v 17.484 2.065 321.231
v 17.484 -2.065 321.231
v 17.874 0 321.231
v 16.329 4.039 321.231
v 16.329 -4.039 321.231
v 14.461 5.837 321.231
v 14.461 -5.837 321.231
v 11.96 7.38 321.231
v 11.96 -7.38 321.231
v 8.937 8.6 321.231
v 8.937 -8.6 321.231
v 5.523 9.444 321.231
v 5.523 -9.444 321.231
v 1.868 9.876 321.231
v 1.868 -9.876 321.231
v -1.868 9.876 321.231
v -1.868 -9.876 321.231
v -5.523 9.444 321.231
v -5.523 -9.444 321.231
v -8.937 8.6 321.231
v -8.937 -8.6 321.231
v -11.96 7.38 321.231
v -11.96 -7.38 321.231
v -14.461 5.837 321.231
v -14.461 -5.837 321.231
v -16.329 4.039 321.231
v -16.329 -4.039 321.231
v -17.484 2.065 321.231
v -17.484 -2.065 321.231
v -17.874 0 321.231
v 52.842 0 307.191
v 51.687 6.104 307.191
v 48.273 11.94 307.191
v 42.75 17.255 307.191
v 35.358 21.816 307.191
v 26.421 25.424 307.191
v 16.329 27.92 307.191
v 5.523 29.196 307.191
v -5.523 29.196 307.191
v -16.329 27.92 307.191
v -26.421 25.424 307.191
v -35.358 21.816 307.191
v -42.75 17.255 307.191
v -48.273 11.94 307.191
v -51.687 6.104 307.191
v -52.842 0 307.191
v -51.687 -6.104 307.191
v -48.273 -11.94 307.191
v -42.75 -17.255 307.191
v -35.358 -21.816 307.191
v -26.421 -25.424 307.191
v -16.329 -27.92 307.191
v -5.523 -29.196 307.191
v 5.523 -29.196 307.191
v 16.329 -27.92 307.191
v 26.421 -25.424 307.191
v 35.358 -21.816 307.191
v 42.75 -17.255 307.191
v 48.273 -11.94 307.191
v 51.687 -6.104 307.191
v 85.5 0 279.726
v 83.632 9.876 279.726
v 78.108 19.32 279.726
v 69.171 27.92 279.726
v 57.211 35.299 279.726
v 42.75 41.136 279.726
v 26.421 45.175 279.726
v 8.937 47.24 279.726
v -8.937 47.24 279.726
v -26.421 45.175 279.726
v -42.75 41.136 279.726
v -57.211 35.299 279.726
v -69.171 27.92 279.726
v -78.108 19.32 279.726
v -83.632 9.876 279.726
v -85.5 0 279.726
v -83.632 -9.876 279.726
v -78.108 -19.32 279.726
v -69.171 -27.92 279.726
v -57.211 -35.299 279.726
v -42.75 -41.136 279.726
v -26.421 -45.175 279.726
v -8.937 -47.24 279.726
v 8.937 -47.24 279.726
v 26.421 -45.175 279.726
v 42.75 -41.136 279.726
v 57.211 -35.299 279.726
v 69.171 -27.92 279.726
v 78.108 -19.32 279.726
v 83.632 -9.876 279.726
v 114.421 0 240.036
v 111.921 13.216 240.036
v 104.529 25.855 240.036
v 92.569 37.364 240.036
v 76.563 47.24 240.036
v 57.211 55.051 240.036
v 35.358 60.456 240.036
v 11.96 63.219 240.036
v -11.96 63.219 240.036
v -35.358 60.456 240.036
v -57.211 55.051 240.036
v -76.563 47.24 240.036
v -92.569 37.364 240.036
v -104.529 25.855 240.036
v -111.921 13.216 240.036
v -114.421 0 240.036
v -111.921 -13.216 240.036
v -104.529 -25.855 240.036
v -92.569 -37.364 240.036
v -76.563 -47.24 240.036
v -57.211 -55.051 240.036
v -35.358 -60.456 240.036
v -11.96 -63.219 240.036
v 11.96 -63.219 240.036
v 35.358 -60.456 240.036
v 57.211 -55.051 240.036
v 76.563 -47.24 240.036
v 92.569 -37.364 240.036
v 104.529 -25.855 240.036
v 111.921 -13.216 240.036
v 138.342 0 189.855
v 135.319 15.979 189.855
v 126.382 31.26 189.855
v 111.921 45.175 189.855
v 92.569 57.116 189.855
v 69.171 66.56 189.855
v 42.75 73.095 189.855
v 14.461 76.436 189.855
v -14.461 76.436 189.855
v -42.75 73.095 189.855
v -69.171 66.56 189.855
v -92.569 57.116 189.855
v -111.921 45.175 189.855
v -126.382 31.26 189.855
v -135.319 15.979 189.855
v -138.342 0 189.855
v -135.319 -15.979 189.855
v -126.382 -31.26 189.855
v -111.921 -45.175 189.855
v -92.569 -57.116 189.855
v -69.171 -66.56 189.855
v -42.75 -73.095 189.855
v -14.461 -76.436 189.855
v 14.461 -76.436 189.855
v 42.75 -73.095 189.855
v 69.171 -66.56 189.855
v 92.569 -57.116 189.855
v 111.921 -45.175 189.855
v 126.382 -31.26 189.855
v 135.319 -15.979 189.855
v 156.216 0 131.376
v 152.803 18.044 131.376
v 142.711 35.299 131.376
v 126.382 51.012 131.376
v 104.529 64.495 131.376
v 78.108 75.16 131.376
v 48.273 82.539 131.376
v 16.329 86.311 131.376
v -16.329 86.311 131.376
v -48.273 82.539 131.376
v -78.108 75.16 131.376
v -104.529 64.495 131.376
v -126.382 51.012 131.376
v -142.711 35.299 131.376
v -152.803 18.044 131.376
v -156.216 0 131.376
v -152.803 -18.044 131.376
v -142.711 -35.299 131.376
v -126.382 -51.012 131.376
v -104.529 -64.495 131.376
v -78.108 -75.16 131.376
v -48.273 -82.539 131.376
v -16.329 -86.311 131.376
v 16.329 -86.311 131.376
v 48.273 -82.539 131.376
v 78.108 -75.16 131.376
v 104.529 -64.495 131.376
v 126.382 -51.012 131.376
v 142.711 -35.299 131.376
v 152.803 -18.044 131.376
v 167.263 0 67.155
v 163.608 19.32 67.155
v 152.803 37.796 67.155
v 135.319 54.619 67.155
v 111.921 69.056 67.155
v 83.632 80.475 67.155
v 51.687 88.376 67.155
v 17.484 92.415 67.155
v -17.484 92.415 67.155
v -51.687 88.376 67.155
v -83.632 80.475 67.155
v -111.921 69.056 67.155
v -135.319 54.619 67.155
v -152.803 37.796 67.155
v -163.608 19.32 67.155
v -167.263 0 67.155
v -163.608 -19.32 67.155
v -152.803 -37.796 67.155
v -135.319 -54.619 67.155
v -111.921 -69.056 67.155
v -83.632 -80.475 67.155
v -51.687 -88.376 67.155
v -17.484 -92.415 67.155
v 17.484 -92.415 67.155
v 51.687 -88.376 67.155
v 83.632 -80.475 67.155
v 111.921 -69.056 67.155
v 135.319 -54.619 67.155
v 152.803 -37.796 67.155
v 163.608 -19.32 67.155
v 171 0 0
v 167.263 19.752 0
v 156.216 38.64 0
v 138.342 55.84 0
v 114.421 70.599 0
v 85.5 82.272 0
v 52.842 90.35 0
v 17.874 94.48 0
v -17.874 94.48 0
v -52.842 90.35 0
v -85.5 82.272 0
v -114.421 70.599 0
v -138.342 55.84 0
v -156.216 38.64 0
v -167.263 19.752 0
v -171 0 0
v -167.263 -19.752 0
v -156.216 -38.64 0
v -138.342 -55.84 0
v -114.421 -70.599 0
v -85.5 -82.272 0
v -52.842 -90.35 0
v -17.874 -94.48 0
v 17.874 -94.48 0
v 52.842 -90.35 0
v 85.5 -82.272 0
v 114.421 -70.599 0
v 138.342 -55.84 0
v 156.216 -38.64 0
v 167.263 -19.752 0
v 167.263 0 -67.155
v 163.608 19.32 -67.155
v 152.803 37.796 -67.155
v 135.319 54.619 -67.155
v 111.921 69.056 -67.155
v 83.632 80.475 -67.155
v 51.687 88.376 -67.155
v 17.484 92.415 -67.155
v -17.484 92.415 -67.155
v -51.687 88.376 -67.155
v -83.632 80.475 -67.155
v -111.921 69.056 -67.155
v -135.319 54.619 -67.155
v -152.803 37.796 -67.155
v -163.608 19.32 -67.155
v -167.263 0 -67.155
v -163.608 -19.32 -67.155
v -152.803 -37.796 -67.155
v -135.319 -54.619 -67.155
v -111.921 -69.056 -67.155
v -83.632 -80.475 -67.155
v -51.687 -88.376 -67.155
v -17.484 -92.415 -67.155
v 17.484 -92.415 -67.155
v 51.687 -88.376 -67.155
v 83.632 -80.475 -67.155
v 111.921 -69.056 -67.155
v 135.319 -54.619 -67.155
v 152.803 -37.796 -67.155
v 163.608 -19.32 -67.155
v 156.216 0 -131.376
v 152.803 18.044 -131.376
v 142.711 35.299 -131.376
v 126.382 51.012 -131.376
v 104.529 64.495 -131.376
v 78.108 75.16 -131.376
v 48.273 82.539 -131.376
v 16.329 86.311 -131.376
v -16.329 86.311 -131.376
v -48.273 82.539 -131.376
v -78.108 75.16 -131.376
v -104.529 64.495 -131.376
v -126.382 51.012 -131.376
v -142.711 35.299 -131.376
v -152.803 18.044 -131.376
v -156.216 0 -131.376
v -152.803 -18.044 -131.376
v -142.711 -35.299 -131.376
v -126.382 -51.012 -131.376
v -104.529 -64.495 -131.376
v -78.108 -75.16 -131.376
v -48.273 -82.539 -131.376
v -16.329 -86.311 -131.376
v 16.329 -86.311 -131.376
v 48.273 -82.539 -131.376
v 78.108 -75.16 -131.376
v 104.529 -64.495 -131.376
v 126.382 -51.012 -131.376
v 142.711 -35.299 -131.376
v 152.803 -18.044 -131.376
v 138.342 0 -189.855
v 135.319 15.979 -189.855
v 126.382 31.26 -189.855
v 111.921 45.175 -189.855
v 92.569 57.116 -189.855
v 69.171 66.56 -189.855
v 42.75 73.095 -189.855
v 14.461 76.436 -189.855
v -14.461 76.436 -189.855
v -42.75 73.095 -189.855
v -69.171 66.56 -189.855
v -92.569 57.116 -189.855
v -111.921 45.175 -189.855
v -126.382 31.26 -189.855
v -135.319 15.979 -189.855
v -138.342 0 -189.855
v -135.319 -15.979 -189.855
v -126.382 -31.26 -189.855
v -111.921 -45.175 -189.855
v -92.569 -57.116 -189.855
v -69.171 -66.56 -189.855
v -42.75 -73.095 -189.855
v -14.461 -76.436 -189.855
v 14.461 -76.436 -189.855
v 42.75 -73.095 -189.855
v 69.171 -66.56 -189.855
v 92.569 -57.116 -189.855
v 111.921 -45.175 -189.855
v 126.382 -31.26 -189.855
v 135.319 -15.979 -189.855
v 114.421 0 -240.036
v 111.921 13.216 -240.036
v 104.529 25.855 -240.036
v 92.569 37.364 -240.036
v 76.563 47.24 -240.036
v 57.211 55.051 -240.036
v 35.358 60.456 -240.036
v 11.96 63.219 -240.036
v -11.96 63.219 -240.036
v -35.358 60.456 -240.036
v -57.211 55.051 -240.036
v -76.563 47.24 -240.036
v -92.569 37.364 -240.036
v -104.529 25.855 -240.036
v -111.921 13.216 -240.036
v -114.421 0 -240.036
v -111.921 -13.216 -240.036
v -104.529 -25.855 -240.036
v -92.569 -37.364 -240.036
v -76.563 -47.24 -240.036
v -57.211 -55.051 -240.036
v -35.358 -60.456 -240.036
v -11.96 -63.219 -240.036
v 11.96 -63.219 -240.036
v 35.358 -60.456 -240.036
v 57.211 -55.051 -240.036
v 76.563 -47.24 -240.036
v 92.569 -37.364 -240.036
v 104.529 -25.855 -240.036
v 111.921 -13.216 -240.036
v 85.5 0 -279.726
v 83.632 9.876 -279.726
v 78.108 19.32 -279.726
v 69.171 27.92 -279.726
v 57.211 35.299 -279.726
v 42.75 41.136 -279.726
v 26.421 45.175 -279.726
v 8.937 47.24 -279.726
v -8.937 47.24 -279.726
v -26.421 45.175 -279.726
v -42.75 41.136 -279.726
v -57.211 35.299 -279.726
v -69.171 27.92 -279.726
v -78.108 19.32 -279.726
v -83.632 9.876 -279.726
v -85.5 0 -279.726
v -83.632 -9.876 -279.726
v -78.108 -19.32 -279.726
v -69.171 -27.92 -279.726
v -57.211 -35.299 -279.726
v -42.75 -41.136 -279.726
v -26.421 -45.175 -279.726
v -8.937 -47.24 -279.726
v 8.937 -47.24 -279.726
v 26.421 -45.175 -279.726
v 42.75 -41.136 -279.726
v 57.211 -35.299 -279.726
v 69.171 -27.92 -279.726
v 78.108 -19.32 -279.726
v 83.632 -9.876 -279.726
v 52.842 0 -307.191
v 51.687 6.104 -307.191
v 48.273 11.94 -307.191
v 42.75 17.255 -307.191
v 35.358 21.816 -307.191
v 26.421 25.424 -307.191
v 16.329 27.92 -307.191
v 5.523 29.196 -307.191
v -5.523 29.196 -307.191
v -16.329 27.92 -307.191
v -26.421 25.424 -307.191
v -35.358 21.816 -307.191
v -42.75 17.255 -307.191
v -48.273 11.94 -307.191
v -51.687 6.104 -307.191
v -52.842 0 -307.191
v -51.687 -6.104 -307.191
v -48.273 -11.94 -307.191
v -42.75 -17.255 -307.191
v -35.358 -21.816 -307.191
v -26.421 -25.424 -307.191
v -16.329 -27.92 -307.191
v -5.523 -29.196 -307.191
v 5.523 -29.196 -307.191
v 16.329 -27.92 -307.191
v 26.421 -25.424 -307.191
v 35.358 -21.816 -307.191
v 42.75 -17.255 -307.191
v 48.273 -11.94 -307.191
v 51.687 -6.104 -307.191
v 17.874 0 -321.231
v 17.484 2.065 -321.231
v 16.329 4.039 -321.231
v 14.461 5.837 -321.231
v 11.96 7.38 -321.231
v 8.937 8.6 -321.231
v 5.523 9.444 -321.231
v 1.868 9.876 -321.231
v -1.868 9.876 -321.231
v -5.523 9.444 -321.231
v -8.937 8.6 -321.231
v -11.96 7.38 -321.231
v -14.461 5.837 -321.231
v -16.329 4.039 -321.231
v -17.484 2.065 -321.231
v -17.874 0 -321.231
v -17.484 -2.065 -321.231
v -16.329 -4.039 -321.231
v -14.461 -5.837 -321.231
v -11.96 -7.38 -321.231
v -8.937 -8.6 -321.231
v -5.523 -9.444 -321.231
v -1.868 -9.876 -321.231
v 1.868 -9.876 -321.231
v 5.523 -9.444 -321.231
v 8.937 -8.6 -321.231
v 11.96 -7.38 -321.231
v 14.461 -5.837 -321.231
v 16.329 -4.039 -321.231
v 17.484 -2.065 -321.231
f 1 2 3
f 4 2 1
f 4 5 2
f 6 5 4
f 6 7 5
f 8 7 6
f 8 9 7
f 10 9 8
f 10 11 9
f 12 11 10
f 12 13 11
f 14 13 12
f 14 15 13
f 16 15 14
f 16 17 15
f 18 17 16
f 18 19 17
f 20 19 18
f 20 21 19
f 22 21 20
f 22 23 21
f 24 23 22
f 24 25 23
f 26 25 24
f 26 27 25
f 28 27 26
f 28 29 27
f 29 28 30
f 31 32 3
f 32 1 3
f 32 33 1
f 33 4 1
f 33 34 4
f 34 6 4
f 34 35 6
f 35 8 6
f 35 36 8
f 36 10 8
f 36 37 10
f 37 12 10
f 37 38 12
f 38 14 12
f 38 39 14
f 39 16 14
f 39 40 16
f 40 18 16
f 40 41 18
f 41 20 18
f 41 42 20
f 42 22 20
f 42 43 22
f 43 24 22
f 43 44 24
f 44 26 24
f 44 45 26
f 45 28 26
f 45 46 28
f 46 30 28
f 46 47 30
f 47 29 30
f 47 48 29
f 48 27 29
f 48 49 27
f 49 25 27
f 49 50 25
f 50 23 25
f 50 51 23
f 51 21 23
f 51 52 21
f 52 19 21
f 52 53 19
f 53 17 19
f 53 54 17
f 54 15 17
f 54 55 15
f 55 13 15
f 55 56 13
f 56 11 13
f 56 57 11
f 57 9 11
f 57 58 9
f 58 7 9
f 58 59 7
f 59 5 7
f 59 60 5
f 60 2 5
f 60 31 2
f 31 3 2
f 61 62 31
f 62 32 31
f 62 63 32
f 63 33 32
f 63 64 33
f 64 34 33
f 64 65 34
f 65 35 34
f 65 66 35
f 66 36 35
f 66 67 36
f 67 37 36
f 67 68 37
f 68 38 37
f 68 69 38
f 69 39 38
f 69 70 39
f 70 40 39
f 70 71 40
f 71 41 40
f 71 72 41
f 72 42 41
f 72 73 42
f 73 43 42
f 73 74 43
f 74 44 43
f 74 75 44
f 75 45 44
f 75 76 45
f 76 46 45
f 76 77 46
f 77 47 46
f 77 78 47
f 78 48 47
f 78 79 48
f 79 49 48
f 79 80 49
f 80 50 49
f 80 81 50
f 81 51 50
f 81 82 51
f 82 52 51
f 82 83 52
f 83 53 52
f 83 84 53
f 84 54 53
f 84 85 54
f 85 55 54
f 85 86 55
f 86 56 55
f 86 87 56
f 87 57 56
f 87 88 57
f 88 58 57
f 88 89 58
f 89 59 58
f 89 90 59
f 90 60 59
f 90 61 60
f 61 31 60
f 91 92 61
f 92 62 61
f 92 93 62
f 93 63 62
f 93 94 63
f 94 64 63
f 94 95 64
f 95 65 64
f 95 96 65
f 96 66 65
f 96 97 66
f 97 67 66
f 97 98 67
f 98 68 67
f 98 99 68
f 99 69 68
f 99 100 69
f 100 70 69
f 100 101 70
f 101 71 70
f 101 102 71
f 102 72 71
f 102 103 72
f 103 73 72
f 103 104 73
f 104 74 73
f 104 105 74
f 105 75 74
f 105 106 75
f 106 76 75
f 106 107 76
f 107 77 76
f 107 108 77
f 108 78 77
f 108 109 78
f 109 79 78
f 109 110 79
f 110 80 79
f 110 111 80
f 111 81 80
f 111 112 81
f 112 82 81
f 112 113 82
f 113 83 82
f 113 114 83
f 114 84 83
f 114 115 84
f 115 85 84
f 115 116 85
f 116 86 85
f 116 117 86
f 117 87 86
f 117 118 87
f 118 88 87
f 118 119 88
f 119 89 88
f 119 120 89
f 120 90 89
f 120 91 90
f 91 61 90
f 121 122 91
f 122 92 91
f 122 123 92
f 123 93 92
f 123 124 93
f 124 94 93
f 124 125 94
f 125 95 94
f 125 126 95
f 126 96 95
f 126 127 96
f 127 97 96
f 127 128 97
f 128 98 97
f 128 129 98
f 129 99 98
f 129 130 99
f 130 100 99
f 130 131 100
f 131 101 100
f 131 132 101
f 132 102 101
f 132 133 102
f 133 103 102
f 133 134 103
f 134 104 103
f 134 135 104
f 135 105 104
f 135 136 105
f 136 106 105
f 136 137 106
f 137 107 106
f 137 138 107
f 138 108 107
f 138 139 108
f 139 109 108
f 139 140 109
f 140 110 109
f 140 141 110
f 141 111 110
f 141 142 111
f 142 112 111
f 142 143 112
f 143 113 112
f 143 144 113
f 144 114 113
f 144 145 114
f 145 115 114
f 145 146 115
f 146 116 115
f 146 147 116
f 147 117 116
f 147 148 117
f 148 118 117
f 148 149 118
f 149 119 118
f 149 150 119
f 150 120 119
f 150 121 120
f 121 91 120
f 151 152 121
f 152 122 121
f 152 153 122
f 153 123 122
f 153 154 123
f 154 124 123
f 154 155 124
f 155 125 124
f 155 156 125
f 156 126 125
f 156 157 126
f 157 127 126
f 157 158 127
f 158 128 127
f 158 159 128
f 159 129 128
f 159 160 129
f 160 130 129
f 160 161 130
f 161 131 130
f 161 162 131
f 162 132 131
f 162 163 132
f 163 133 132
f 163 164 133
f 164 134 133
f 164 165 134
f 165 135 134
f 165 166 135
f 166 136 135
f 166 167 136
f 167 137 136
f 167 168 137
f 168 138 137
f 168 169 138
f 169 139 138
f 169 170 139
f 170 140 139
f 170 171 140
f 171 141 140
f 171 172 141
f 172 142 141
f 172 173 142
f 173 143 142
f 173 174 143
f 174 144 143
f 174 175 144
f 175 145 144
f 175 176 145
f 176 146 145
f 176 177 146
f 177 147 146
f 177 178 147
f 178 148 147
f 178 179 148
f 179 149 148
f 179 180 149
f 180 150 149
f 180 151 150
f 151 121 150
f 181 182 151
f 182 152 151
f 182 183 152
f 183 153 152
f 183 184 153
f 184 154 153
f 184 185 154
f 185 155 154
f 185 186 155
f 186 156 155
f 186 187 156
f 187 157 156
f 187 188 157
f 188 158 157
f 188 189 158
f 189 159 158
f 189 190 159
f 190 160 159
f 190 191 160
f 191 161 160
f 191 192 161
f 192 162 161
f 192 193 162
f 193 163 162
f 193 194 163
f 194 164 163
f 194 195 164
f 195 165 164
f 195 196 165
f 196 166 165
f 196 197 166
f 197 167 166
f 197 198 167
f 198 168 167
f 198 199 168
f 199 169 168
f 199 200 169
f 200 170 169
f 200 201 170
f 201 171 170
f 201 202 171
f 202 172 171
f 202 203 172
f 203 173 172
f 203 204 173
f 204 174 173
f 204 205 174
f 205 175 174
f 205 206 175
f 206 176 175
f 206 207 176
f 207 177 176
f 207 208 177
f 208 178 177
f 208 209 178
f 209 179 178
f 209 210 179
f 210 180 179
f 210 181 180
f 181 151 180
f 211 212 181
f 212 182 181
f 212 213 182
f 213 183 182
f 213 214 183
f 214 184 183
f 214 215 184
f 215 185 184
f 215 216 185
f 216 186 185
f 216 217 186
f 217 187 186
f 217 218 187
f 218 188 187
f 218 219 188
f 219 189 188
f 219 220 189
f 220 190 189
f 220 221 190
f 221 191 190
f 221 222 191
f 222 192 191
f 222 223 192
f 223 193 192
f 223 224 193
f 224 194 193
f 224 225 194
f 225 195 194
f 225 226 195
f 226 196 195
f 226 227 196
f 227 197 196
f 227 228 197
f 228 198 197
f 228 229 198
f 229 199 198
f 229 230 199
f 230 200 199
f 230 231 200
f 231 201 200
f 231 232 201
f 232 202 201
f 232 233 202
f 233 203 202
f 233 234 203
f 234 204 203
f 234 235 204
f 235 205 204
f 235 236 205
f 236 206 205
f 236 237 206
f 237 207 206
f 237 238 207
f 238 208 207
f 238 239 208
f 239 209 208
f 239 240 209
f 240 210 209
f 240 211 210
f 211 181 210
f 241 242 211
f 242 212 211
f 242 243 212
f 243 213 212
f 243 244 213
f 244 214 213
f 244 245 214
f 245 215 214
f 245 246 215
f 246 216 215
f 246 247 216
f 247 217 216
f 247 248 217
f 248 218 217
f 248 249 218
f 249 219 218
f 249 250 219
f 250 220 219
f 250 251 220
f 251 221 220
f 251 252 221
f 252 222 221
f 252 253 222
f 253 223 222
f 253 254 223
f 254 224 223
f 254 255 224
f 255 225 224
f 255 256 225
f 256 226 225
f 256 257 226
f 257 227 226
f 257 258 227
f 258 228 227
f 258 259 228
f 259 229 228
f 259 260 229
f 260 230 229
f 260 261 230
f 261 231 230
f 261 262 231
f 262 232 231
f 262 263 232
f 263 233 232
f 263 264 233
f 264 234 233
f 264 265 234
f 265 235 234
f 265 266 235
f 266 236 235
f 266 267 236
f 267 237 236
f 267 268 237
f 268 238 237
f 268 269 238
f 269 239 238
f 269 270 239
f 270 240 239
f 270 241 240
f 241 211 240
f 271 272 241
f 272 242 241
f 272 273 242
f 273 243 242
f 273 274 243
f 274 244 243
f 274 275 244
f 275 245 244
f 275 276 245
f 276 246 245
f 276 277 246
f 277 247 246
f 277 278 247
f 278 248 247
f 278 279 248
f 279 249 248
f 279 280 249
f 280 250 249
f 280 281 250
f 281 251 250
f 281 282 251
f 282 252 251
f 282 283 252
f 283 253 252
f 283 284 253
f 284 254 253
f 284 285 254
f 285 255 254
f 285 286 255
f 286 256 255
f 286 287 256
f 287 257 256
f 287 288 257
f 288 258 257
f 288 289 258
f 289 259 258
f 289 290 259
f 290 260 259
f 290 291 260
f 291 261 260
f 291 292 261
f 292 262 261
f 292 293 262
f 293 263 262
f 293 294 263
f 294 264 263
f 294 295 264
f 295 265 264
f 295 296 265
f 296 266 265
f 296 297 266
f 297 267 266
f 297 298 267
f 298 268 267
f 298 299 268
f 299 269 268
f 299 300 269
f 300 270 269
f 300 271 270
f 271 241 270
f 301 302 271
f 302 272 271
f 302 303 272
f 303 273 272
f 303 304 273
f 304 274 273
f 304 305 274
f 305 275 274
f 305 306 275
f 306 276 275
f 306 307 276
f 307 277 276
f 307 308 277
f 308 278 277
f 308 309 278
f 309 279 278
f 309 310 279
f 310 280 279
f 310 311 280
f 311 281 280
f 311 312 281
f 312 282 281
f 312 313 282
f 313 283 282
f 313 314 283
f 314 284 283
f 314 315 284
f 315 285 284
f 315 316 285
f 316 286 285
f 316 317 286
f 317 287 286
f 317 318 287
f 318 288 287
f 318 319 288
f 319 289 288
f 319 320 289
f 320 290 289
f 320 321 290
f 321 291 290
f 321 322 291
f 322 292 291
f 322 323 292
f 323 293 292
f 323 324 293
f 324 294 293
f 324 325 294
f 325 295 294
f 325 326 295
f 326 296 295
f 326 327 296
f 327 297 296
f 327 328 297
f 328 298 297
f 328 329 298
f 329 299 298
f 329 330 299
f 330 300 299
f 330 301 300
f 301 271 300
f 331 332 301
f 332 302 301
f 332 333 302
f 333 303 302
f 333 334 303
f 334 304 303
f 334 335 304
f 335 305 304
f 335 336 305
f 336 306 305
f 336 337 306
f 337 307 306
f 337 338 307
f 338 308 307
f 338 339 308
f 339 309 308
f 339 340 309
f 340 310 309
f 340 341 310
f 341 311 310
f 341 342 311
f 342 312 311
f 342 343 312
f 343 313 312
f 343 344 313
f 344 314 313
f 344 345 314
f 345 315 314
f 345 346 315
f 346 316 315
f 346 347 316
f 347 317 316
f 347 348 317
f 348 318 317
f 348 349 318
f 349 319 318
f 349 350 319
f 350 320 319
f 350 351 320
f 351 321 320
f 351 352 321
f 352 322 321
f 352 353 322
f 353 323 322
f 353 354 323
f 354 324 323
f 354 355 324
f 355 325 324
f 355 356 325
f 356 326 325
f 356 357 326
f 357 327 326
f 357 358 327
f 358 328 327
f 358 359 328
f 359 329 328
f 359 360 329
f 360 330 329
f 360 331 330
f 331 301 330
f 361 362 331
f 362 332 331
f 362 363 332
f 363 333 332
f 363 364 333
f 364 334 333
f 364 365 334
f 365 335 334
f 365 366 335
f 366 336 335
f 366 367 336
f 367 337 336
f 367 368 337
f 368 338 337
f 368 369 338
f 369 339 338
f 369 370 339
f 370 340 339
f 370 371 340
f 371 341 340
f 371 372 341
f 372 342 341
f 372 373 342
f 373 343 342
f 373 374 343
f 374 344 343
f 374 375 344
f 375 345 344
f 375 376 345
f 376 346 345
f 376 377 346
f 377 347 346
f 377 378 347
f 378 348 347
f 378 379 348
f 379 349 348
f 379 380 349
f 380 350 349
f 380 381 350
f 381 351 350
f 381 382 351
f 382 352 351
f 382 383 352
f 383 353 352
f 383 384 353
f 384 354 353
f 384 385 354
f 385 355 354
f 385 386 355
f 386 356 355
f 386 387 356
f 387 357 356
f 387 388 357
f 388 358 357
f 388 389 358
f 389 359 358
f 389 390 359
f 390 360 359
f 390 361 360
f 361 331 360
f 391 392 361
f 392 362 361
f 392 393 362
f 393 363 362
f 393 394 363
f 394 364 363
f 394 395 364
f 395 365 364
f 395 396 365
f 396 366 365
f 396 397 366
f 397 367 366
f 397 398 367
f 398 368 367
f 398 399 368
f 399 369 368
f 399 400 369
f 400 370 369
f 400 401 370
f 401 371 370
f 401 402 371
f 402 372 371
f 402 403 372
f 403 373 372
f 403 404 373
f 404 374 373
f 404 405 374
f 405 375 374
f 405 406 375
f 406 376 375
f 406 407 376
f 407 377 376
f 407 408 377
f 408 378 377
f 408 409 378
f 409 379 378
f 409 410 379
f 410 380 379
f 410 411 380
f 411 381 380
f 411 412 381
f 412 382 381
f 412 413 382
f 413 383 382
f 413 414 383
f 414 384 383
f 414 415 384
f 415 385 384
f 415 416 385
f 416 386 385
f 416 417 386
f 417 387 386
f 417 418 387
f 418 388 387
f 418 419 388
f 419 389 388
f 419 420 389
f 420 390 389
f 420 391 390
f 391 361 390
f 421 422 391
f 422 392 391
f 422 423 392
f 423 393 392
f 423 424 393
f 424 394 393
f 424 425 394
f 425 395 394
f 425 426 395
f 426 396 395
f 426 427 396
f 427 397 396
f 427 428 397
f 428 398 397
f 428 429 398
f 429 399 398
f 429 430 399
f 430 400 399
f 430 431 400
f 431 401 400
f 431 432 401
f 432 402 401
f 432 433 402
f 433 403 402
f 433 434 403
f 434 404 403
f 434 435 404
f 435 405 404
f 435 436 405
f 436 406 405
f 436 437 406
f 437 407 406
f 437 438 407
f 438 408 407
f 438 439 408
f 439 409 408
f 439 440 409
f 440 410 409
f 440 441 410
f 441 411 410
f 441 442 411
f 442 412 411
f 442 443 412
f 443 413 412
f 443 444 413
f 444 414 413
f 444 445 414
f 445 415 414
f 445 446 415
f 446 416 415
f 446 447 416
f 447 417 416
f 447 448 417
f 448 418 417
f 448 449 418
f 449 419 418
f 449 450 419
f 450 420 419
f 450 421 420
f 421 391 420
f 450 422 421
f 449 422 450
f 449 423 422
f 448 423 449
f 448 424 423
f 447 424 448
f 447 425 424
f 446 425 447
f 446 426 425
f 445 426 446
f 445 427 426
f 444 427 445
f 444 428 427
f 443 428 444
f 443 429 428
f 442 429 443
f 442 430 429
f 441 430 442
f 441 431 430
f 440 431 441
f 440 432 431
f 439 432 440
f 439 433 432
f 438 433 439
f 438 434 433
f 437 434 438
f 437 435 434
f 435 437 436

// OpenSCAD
// Generated by SolidPython 1.0.1 on 2020-07-29 00:46:48


scale(v = [9, 5, 17]) {
	sphere(r = 19);
}
/***********************************************
*********      SolidPython code:      **********
************************************************
 
# import packages: SolidPython
from solid import *
from solid.utils import *
from itertools import chain, combinations, permutations


class Resize:

    def __init__(self, scad_file):
        self.scad_file = scad_file
        #self.scad_file = import_scad(scad_file)
        # cone/cylinder param:
        self.r1 = 0
        self.r2 = 0
        self.h = 0
        # rectangular prism param:
        self.w = 0
        self.l = 0
        # ellipse param:
        self.r = 0

    # import OpenScad code (file name corresponds to shape)


    # classify shape + parameters
    def assign(self, param1, param2, param3):
        if self.scad_file == 'cone.scad':
            self.r1 = param1
            self.r2 = param2
            self.h = param3
        elif self.scad_file == 'cylinder.scad':
            self.r1 = param1
            self.r2 = param2
            self.h = param3
        elif self.scad_file == 'rectangularPrism.scad':
            self.h = param1
            self.l = param2
            self.w = param3
        else:
            self.r = param1
            self.h = param2

    # resize parameters
    def iterate(self):
        x = range(3, 20, 2)
        i = 1
        if self.scad_file == 'cone.scad':
            tempList = list(permutations(x, 2))
            for temp in tempList:
                param1 = temp[0]
                param2 = temp[1]
                filepath = 'produced_scad_files/' + 'cone' + str(param1) + '_' + str(param2) + '_' + '.scad'
                scad_render_to_file(cylinder(h=param1, r1=param2, r2=0), filepath)

        elif self.scad_file == 'cylinder.scad':
            tempList = list(permutations(x, 3))
            for temp in tempList:
                param1 = temp[0]
                param2 = temp[1]
                filepath = 'produced_scad_files/' + 'cylinder' + str(param1) + '_' + str(param2) + '_' + '.scad'
                scad_render_to_file(cylinder(h=param1, r1=param2, r2=param2), filepath)

        elif self.scad_file == 'rectangularPrism.scad':
            tempList = list(permutations(x, 3))
            for temp in tempList:
                param1 = temp[0]
                param2 = temp[1]
                param3 = temp[2]
                filepath = 'produced_scad_files/' + 'rectangularPrism' + str(param1) + '_' + str(param2) + '_' + str(
                    param3) + '.scad'
                scad_render_to_file(cube(size=(param1, param2, param3)), filepath)

        elif self.scad_file == 'ellipse.scad':
            tempList = list(permutations(x, 4))
            for temp in tempList:
                param1 = temp[0]
                param2 = temp[1]
                param3 = temp[2]
                param4 = temp[3]
                filepath = 'produced_scad_files/' + 'ellipse' + str(param1) + '_' + str(param2) + '_' + str(param3) + '_' + str(param4) + '.scad'
                scad_render_to_file(scale([param1, param2, param3])(sphere(r=param4)), filepath)

    def render_to_scadfile(self):
        scad_render_to_file(scad, 'example.scad') 
 
************************************************/
